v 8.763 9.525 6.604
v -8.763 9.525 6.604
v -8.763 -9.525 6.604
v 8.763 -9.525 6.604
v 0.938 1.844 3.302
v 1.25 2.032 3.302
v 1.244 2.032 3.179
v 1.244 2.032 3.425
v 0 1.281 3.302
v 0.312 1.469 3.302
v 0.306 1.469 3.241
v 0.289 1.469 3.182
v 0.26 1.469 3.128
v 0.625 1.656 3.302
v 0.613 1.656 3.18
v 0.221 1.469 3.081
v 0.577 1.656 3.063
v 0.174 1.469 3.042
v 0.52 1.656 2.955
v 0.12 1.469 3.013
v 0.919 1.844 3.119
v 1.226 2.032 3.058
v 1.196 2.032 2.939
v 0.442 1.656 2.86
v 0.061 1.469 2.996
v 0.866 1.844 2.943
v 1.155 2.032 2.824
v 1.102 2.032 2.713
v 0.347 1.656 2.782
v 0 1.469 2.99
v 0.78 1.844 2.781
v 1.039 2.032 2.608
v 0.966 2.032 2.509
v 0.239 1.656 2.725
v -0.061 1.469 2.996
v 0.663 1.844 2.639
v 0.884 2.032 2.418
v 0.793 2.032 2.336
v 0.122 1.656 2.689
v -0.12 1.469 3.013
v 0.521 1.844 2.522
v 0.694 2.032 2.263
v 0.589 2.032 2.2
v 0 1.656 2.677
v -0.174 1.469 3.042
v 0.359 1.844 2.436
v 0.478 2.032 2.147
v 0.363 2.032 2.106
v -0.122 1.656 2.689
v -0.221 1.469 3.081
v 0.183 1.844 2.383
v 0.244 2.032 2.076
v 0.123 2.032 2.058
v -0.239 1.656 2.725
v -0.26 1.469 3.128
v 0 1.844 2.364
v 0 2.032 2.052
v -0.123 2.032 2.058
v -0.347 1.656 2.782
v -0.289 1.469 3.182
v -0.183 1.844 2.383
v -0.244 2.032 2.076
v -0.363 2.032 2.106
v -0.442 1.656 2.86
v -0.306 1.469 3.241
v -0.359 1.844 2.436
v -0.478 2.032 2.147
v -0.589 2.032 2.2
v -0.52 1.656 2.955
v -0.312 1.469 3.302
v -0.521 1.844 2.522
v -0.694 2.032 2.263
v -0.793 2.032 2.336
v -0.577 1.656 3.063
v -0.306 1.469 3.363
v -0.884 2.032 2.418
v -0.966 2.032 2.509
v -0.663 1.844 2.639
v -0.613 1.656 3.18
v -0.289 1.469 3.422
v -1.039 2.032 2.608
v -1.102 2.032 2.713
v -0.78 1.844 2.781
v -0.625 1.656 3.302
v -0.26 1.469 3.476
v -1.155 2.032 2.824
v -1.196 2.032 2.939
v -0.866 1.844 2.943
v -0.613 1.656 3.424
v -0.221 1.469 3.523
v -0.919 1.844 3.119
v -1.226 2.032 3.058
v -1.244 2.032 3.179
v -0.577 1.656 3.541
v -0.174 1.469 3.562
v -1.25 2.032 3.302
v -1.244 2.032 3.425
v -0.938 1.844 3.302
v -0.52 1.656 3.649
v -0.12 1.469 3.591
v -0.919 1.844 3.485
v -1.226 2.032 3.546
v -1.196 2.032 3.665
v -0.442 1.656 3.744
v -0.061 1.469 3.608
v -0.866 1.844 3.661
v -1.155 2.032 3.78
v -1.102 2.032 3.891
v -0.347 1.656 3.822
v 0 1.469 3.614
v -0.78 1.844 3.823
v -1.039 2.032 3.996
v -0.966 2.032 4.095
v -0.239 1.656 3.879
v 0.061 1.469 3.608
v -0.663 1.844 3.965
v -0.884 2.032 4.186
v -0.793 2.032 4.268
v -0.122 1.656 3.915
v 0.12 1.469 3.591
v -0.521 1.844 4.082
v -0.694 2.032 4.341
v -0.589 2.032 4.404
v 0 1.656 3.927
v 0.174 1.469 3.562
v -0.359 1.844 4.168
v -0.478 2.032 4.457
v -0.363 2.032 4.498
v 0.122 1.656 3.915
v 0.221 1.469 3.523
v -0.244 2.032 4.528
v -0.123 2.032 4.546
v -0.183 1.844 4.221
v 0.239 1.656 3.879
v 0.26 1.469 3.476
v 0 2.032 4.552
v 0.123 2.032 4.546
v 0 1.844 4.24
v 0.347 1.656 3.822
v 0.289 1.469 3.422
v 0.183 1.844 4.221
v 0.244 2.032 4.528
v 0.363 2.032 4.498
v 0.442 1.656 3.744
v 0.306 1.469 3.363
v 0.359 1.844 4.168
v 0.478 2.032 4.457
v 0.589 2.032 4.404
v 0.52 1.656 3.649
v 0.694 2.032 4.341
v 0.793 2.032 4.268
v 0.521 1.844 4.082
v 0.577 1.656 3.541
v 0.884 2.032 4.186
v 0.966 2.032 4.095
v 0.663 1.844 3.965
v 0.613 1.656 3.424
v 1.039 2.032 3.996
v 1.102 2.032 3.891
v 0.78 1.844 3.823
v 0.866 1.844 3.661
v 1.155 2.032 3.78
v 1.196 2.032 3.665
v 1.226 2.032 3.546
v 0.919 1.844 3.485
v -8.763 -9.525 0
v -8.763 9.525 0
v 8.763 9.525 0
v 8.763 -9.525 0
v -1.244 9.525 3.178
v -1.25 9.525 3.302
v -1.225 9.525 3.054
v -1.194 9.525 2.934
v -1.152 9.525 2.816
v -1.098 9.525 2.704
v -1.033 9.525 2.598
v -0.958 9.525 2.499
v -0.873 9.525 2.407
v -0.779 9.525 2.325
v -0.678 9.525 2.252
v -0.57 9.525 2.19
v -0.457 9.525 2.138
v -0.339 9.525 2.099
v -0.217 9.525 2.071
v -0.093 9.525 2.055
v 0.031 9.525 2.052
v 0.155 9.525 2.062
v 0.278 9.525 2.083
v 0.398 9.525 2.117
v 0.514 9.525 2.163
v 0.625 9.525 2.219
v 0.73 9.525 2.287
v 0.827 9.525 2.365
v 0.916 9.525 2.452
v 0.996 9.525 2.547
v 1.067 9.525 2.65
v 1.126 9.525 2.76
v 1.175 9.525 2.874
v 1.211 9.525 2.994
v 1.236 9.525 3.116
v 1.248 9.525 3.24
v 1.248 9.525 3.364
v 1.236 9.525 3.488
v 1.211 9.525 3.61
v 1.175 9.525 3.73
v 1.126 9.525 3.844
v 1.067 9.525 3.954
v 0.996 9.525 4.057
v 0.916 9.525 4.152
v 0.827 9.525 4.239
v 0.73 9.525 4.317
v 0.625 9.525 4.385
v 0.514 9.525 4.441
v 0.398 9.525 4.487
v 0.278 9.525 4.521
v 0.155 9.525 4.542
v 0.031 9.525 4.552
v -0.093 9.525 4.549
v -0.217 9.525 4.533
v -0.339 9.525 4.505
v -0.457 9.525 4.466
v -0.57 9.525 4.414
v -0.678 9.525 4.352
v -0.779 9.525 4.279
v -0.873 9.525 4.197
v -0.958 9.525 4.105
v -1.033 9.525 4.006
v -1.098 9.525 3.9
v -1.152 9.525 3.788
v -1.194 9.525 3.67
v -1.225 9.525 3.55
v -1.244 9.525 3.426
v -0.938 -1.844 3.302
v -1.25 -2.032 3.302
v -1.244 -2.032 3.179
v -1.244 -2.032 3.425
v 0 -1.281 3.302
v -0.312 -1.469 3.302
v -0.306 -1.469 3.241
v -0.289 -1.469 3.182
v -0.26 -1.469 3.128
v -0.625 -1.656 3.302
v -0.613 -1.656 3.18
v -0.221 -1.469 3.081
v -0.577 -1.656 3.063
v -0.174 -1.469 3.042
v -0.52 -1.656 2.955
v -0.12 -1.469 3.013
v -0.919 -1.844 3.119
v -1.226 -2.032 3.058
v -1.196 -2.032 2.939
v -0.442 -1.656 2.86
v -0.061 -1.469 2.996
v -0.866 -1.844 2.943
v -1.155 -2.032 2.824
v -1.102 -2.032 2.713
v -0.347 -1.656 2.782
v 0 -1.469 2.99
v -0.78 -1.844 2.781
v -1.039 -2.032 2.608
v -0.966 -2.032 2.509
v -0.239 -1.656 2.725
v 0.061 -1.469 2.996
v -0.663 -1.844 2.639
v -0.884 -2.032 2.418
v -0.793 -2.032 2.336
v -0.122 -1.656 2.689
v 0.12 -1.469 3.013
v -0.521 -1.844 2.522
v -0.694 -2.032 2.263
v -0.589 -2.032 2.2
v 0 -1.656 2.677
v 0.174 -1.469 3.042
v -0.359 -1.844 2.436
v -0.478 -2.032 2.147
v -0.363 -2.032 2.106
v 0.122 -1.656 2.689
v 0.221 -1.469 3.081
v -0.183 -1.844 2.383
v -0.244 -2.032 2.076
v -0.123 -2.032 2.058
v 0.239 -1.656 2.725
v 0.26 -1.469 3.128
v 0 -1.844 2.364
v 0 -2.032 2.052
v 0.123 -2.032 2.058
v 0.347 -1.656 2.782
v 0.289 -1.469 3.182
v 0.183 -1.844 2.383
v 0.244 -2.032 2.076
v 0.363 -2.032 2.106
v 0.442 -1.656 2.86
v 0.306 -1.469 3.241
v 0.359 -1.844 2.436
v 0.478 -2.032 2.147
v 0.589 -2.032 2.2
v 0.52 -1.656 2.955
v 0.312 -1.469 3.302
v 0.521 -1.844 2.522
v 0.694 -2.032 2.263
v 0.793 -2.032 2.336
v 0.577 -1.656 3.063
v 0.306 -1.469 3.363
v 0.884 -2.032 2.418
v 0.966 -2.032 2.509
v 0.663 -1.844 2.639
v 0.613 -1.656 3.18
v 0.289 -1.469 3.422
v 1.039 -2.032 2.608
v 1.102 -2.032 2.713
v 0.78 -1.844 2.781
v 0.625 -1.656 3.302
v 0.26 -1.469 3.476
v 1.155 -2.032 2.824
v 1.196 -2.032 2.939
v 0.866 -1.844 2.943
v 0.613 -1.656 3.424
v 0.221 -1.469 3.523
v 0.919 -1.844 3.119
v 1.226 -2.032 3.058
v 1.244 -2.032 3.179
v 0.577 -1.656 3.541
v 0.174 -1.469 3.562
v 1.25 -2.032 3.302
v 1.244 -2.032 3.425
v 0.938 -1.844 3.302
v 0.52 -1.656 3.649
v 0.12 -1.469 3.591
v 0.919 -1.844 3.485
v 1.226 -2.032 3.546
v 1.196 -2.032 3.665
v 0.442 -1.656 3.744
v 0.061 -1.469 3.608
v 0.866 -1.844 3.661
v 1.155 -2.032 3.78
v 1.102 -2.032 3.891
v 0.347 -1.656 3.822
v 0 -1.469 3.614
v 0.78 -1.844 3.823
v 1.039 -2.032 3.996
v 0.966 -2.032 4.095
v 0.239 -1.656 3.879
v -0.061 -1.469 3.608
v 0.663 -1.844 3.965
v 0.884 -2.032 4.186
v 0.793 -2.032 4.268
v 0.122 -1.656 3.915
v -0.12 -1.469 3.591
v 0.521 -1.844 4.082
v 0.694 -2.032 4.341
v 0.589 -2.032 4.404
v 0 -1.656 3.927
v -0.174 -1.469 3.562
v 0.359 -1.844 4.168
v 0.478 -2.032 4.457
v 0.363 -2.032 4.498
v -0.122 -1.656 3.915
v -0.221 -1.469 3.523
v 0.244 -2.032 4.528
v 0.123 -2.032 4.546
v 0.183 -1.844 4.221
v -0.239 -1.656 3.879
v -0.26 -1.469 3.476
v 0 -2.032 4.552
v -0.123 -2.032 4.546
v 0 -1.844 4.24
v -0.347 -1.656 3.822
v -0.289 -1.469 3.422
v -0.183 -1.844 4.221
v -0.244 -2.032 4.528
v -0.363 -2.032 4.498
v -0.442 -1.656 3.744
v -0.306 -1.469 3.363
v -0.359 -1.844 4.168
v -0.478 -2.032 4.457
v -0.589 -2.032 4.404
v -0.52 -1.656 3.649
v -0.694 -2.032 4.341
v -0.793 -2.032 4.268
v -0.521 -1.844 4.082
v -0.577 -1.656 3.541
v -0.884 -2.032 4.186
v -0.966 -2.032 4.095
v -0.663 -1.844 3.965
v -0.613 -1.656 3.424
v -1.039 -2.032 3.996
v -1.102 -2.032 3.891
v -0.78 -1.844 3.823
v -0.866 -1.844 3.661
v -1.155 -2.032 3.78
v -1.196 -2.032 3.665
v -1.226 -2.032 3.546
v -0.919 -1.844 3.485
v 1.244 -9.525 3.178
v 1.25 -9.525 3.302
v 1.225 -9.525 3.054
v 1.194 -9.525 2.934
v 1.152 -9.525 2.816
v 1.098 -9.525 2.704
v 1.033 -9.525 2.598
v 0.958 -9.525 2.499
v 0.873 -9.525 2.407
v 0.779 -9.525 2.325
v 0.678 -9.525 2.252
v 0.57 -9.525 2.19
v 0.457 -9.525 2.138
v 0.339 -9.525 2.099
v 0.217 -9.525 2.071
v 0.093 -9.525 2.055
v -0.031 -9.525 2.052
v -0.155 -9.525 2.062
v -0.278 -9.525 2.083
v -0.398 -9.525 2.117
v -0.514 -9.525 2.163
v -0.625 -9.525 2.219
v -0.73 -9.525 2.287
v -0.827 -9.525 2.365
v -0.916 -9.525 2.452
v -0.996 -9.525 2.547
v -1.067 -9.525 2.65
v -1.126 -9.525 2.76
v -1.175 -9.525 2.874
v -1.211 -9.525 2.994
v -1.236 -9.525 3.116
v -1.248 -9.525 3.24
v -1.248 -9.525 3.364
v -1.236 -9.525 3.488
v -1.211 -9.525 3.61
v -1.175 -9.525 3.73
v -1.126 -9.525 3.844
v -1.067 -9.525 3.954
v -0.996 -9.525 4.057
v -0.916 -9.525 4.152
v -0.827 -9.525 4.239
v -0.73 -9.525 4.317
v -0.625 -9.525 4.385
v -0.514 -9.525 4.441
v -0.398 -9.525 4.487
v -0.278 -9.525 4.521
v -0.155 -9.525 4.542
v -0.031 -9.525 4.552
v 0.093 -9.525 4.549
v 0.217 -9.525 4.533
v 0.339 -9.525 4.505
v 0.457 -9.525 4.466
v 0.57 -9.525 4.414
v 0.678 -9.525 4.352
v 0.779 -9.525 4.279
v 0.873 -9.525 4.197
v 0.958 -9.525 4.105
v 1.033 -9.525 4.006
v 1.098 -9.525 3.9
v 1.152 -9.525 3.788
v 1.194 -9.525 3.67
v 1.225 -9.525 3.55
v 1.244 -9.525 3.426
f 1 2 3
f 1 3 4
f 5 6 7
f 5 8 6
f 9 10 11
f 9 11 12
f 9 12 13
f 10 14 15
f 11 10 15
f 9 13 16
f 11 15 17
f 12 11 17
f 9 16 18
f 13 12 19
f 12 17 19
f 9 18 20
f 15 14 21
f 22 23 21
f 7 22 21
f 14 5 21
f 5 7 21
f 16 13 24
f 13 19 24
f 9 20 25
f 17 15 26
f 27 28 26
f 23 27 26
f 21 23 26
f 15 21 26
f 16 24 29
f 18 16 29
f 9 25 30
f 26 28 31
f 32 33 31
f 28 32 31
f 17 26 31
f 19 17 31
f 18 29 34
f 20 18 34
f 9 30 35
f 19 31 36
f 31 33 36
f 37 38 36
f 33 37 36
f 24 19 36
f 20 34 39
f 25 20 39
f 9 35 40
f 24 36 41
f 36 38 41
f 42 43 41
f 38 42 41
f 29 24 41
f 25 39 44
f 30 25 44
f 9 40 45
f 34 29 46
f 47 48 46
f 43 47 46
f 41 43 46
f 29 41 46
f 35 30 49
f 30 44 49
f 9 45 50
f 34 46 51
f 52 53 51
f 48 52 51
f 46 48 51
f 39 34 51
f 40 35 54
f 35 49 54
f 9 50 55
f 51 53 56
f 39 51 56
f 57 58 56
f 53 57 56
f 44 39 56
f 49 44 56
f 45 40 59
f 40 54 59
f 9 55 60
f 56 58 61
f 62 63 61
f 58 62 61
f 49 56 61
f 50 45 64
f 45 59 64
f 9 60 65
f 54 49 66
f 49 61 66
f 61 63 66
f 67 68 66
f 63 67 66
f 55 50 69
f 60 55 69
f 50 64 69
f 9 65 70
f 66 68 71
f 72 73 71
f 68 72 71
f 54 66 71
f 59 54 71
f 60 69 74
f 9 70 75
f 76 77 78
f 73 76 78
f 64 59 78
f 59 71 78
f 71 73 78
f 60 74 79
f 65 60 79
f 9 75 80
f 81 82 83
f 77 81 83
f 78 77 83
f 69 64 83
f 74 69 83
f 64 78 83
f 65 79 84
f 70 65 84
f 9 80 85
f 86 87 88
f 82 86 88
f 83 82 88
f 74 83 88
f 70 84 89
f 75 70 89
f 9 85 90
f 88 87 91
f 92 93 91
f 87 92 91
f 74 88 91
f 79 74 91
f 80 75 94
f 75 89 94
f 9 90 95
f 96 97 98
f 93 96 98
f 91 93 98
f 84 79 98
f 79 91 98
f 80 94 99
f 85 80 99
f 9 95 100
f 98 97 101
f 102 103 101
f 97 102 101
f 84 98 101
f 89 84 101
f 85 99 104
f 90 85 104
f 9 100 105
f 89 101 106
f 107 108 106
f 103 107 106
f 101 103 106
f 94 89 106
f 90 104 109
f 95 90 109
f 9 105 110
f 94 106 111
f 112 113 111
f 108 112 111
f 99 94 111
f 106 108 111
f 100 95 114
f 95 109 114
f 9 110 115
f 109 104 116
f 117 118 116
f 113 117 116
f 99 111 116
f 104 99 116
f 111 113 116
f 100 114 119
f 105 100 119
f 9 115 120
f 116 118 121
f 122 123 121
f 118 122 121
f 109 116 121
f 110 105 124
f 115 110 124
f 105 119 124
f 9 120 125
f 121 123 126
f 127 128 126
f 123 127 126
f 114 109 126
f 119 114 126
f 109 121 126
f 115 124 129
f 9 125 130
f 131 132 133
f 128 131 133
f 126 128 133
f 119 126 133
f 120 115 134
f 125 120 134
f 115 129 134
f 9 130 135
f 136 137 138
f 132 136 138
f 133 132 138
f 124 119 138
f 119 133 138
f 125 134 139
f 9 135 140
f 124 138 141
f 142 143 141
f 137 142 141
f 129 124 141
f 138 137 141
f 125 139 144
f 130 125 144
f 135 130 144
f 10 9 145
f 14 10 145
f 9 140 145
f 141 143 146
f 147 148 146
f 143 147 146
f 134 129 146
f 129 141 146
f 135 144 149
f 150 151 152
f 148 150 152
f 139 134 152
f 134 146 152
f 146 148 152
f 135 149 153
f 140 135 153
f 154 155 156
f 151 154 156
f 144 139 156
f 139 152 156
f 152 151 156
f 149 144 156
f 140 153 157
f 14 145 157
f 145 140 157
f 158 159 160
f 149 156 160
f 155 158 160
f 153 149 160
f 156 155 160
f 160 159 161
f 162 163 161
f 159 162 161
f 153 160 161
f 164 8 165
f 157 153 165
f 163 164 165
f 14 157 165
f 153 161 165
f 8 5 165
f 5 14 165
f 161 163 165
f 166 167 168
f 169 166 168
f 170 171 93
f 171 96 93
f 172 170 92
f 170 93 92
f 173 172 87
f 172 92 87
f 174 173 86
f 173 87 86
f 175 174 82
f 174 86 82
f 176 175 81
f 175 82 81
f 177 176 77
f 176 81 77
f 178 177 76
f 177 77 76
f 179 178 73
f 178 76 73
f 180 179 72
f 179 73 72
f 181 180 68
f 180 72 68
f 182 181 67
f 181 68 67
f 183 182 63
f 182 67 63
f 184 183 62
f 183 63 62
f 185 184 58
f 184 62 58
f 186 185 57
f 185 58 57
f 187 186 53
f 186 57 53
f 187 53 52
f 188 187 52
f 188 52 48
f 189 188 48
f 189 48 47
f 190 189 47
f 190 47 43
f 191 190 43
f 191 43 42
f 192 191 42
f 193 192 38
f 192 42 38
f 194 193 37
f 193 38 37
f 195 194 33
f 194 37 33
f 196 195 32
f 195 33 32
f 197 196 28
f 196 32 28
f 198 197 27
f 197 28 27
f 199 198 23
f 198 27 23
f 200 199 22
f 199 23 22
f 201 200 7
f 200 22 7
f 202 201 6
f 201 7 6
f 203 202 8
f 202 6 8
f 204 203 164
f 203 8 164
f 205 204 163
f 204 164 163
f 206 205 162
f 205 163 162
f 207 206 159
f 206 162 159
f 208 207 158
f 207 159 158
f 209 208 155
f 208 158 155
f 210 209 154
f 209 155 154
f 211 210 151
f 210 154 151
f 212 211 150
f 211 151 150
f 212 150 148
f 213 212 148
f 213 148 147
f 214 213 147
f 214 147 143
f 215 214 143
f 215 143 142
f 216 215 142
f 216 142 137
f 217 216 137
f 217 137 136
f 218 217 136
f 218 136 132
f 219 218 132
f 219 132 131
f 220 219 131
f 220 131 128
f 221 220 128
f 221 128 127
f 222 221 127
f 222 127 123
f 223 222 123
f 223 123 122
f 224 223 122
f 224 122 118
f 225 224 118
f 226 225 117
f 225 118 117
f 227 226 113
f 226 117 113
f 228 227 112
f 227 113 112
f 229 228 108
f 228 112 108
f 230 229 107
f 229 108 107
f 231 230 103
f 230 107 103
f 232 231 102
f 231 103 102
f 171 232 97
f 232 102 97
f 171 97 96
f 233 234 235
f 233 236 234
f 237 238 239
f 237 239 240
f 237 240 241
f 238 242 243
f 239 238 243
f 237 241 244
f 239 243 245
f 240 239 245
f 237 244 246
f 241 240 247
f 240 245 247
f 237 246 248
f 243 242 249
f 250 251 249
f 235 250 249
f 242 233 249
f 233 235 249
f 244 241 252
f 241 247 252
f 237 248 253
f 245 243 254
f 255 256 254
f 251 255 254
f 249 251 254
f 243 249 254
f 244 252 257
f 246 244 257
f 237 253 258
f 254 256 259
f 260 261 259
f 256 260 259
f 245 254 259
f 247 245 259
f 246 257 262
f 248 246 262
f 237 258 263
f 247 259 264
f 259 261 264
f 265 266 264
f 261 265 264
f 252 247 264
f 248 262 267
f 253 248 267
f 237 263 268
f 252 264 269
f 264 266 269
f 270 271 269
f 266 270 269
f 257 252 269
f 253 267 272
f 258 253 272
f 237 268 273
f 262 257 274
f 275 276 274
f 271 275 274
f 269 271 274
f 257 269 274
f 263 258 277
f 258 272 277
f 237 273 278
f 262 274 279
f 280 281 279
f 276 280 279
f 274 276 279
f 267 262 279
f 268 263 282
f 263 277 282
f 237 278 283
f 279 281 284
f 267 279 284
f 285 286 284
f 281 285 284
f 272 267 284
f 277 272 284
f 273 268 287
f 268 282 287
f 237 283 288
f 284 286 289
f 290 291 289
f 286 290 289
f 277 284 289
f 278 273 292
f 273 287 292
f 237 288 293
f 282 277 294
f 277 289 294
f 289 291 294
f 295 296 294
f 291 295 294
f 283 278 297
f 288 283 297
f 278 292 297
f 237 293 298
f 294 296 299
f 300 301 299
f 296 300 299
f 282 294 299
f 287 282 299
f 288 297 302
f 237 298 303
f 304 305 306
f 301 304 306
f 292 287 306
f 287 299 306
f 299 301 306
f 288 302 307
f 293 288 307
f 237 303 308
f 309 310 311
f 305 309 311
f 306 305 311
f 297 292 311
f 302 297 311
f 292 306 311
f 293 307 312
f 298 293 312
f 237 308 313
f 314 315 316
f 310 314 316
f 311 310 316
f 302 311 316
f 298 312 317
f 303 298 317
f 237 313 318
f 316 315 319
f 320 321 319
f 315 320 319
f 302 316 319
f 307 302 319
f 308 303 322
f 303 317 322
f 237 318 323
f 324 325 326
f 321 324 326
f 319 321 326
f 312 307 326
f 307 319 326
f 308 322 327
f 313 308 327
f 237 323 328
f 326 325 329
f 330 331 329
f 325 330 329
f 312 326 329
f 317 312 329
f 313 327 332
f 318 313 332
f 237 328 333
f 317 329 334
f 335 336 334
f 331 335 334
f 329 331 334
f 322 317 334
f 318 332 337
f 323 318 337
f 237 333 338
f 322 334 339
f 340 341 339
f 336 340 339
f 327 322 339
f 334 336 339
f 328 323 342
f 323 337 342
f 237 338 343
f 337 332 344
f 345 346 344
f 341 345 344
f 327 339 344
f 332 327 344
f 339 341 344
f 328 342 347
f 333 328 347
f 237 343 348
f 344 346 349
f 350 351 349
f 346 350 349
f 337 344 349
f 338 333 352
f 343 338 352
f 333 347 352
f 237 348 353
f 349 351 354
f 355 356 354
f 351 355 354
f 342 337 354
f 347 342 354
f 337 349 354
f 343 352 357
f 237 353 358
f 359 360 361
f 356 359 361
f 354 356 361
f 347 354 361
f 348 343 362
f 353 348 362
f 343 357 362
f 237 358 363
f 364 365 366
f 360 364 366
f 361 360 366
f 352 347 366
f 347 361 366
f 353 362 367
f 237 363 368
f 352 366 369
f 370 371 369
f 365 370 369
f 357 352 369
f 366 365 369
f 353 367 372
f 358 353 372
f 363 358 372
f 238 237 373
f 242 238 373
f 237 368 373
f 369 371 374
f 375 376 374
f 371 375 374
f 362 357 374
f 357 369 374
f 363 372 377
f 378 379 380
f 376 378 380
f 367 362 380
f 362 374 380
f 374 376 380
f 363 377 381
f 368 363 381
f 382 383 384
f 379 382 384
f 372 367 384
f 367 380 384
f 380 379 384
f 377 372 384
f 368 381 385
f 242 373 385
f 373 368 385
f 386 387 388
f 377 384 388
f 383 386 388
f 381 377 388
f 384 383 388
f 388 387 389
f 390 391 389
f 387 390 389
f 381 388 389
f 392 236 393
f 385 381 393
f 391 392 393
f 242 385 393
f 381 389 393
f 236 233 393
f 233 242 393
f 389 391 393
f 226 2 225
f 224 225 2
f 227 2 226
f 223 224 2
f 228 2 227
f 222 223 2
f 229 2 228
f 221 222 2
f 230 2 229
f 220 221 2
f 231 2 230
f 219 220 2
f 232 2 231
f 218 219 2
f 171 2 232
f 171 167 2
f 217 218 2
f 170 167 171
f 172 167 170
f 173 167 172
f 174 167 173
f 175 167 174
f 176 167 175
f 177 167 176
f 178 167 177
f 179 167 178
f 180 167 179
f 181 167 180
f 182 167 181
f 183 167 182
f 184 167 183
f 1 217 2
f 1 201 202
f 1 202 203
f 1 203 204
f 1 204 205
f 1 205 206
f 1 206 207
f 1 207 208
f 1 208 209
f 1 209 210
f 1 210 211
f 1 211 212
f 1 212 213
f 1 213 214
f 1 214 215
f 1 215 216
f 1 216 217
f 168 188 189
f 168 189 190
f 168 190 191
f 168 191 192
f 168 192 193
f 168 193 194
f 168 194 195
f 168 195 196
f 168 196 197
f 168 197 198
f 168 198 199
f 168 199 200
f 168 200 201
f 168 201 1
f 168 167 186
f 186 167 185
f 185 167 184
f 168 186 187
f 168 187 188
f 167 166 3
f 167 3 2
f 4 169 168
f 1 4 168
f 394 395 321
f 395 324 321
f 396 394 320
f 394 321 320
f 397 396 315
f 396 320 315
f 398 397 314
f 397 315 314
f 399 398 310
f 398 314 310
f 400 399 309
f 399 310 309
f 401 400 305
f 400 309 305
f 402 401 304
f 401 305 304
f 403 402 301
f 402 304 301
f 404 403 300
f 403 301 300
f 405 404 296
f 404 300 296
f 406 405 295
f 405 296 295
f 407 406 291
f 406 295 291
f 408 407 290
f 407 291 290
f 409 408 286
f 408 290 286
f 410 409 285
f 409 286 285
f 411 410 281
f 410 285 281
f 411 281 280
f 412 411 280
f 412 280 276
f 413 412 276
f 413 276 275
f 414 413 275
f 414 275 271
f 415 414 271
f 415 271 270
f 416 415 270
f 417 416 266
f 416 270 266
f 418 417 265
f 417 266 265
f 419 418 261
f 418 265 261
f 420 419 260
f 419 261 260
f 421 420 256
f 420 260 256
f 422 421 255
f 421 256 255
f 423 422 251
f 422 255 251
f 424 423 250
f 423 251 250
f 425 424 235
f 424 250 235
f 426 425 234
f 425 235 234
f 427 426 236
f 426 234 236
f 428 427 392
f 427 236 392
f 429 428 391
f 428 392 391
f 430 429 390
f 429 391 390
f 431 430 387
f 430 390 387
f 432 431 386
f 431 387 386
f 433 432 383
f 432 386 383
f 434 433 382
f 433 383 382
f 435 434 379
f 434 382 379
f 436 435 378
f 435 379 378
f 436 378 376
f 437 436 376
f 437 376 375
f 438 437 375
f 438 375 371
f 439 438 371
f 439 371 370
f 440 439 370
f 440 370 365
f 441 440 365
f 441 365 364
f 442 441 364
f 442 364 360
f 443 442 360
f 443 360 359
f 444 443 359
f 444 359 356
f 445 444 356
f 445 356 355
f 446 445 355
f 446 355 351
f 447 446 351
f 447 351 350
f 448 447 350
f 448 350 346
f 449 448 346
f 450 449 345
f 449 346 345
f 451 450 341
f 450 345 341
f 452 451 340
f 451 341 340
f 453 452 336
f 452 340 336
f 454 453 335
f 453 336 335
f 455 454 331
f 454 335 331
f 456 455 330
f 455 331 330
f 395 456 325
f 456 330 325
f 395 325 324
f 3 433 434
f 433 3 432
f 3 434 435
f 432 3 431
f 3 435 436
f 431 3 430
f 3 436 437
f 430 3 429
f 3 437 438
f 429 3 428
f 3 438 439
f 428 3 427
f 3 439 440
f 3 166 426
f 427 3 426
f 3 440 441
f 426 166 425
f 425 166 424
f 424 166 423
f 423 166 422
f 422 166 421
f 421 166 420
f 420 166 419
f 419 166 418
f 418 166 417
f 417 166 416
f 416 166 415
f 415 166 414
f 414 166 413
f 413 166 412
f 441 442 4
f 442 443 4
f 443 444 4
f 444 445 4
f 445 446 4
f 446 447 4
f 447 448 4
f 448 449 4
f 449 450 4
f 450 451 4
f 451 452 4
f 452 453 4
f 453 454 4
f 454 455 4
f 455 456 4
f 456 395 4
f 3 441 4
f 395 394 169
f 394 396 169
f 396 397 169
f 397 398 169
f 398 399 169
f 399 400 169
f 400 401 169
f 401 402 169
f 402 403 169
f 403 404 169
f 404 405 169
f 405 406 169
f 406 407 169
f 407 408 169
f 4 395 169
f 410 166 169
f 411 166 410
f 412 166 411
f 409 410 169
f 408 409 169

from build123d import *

# Parameters (mm, degrees)
SKETCH1_W                 = 17.526
SKETCH1_H                 = 19.05
BOSS_EXTRUDE1_DEPTH       = 6.604
M3X0_5_TAPPED_HOLE1_D     = 2.5
M3X0_5_TAPPED_HOLE1_DEPTH = 7.493
M3X0_5_TAPPED_HOLE1_TIP   = 0.751075774
M3X0_5_TAPPED_HOLE2_D     = 2.5
M3X0_5_TAPPED_HOLE2_DEPTH = 7.493
M3X0_5_TAPPED_HOLE2_TIP   = 0.751075774


with BuildPart() as part:
    # Sketch1 → Boss-Extrude1 (new body)
    with BuildSketch(Plane.XY):
        Rectangle(SKETCH1_W, SKETCH1_H)
    extrude(amount=BOSS_EXTRUDE1_DEPTH)

    # M3x0.5 Tapped Hole1
    with Locations(Plane(origin=(0, 9.525, 0), x_dir=(1, 0, 0), z_dir=(0, 1, 0))):
        with Locations((0, -3.302)):
            Hole(M3X0_5_TAPPED_HOLE1_D / 2, depth=M3X0_5_TAPPED_HOLE1_DEPTH)
            with Locations((0, 0, -(M3X0_5_TAPPED_HOLE1_DEPTH + M3X0_5_TAPPED_HOLE1_TIP / 2))):  # 118° drill point
                Cone(0, M3X0_5_TAPPED_HOLE1_D / 2, M3X0_5_TAPPED_HOLE1_TIP, mode=Mode.SUBTRACT)

    # M3x0.5 Tapped Hole2
    with Locations(Plane(origin=(0, -9.525, 0), x_dir=(-1, 0, 0), z_dir=(0, -1, 0))):
        with Locations((0, -3.302)):
            Hole(M3X0_5_TAPPED_HOLE2_D / 2, depth=M3X0_5_TAPPED_HOLE2_DEPTH)
            with Locations((0, 0, -(M3X0_5_TAPPED_HOLE2_DEPTH + M3X0_5_TAPPED_HOLE2_TIP / 2))):  # 118° drill point
                Cone(0, M3X0_5_TAPPED_HOLE2_D / 2, M3X0_5_TAPPED_HOLE2_TIP, mode=Mode.SUBTRACT)


solid = part.part
